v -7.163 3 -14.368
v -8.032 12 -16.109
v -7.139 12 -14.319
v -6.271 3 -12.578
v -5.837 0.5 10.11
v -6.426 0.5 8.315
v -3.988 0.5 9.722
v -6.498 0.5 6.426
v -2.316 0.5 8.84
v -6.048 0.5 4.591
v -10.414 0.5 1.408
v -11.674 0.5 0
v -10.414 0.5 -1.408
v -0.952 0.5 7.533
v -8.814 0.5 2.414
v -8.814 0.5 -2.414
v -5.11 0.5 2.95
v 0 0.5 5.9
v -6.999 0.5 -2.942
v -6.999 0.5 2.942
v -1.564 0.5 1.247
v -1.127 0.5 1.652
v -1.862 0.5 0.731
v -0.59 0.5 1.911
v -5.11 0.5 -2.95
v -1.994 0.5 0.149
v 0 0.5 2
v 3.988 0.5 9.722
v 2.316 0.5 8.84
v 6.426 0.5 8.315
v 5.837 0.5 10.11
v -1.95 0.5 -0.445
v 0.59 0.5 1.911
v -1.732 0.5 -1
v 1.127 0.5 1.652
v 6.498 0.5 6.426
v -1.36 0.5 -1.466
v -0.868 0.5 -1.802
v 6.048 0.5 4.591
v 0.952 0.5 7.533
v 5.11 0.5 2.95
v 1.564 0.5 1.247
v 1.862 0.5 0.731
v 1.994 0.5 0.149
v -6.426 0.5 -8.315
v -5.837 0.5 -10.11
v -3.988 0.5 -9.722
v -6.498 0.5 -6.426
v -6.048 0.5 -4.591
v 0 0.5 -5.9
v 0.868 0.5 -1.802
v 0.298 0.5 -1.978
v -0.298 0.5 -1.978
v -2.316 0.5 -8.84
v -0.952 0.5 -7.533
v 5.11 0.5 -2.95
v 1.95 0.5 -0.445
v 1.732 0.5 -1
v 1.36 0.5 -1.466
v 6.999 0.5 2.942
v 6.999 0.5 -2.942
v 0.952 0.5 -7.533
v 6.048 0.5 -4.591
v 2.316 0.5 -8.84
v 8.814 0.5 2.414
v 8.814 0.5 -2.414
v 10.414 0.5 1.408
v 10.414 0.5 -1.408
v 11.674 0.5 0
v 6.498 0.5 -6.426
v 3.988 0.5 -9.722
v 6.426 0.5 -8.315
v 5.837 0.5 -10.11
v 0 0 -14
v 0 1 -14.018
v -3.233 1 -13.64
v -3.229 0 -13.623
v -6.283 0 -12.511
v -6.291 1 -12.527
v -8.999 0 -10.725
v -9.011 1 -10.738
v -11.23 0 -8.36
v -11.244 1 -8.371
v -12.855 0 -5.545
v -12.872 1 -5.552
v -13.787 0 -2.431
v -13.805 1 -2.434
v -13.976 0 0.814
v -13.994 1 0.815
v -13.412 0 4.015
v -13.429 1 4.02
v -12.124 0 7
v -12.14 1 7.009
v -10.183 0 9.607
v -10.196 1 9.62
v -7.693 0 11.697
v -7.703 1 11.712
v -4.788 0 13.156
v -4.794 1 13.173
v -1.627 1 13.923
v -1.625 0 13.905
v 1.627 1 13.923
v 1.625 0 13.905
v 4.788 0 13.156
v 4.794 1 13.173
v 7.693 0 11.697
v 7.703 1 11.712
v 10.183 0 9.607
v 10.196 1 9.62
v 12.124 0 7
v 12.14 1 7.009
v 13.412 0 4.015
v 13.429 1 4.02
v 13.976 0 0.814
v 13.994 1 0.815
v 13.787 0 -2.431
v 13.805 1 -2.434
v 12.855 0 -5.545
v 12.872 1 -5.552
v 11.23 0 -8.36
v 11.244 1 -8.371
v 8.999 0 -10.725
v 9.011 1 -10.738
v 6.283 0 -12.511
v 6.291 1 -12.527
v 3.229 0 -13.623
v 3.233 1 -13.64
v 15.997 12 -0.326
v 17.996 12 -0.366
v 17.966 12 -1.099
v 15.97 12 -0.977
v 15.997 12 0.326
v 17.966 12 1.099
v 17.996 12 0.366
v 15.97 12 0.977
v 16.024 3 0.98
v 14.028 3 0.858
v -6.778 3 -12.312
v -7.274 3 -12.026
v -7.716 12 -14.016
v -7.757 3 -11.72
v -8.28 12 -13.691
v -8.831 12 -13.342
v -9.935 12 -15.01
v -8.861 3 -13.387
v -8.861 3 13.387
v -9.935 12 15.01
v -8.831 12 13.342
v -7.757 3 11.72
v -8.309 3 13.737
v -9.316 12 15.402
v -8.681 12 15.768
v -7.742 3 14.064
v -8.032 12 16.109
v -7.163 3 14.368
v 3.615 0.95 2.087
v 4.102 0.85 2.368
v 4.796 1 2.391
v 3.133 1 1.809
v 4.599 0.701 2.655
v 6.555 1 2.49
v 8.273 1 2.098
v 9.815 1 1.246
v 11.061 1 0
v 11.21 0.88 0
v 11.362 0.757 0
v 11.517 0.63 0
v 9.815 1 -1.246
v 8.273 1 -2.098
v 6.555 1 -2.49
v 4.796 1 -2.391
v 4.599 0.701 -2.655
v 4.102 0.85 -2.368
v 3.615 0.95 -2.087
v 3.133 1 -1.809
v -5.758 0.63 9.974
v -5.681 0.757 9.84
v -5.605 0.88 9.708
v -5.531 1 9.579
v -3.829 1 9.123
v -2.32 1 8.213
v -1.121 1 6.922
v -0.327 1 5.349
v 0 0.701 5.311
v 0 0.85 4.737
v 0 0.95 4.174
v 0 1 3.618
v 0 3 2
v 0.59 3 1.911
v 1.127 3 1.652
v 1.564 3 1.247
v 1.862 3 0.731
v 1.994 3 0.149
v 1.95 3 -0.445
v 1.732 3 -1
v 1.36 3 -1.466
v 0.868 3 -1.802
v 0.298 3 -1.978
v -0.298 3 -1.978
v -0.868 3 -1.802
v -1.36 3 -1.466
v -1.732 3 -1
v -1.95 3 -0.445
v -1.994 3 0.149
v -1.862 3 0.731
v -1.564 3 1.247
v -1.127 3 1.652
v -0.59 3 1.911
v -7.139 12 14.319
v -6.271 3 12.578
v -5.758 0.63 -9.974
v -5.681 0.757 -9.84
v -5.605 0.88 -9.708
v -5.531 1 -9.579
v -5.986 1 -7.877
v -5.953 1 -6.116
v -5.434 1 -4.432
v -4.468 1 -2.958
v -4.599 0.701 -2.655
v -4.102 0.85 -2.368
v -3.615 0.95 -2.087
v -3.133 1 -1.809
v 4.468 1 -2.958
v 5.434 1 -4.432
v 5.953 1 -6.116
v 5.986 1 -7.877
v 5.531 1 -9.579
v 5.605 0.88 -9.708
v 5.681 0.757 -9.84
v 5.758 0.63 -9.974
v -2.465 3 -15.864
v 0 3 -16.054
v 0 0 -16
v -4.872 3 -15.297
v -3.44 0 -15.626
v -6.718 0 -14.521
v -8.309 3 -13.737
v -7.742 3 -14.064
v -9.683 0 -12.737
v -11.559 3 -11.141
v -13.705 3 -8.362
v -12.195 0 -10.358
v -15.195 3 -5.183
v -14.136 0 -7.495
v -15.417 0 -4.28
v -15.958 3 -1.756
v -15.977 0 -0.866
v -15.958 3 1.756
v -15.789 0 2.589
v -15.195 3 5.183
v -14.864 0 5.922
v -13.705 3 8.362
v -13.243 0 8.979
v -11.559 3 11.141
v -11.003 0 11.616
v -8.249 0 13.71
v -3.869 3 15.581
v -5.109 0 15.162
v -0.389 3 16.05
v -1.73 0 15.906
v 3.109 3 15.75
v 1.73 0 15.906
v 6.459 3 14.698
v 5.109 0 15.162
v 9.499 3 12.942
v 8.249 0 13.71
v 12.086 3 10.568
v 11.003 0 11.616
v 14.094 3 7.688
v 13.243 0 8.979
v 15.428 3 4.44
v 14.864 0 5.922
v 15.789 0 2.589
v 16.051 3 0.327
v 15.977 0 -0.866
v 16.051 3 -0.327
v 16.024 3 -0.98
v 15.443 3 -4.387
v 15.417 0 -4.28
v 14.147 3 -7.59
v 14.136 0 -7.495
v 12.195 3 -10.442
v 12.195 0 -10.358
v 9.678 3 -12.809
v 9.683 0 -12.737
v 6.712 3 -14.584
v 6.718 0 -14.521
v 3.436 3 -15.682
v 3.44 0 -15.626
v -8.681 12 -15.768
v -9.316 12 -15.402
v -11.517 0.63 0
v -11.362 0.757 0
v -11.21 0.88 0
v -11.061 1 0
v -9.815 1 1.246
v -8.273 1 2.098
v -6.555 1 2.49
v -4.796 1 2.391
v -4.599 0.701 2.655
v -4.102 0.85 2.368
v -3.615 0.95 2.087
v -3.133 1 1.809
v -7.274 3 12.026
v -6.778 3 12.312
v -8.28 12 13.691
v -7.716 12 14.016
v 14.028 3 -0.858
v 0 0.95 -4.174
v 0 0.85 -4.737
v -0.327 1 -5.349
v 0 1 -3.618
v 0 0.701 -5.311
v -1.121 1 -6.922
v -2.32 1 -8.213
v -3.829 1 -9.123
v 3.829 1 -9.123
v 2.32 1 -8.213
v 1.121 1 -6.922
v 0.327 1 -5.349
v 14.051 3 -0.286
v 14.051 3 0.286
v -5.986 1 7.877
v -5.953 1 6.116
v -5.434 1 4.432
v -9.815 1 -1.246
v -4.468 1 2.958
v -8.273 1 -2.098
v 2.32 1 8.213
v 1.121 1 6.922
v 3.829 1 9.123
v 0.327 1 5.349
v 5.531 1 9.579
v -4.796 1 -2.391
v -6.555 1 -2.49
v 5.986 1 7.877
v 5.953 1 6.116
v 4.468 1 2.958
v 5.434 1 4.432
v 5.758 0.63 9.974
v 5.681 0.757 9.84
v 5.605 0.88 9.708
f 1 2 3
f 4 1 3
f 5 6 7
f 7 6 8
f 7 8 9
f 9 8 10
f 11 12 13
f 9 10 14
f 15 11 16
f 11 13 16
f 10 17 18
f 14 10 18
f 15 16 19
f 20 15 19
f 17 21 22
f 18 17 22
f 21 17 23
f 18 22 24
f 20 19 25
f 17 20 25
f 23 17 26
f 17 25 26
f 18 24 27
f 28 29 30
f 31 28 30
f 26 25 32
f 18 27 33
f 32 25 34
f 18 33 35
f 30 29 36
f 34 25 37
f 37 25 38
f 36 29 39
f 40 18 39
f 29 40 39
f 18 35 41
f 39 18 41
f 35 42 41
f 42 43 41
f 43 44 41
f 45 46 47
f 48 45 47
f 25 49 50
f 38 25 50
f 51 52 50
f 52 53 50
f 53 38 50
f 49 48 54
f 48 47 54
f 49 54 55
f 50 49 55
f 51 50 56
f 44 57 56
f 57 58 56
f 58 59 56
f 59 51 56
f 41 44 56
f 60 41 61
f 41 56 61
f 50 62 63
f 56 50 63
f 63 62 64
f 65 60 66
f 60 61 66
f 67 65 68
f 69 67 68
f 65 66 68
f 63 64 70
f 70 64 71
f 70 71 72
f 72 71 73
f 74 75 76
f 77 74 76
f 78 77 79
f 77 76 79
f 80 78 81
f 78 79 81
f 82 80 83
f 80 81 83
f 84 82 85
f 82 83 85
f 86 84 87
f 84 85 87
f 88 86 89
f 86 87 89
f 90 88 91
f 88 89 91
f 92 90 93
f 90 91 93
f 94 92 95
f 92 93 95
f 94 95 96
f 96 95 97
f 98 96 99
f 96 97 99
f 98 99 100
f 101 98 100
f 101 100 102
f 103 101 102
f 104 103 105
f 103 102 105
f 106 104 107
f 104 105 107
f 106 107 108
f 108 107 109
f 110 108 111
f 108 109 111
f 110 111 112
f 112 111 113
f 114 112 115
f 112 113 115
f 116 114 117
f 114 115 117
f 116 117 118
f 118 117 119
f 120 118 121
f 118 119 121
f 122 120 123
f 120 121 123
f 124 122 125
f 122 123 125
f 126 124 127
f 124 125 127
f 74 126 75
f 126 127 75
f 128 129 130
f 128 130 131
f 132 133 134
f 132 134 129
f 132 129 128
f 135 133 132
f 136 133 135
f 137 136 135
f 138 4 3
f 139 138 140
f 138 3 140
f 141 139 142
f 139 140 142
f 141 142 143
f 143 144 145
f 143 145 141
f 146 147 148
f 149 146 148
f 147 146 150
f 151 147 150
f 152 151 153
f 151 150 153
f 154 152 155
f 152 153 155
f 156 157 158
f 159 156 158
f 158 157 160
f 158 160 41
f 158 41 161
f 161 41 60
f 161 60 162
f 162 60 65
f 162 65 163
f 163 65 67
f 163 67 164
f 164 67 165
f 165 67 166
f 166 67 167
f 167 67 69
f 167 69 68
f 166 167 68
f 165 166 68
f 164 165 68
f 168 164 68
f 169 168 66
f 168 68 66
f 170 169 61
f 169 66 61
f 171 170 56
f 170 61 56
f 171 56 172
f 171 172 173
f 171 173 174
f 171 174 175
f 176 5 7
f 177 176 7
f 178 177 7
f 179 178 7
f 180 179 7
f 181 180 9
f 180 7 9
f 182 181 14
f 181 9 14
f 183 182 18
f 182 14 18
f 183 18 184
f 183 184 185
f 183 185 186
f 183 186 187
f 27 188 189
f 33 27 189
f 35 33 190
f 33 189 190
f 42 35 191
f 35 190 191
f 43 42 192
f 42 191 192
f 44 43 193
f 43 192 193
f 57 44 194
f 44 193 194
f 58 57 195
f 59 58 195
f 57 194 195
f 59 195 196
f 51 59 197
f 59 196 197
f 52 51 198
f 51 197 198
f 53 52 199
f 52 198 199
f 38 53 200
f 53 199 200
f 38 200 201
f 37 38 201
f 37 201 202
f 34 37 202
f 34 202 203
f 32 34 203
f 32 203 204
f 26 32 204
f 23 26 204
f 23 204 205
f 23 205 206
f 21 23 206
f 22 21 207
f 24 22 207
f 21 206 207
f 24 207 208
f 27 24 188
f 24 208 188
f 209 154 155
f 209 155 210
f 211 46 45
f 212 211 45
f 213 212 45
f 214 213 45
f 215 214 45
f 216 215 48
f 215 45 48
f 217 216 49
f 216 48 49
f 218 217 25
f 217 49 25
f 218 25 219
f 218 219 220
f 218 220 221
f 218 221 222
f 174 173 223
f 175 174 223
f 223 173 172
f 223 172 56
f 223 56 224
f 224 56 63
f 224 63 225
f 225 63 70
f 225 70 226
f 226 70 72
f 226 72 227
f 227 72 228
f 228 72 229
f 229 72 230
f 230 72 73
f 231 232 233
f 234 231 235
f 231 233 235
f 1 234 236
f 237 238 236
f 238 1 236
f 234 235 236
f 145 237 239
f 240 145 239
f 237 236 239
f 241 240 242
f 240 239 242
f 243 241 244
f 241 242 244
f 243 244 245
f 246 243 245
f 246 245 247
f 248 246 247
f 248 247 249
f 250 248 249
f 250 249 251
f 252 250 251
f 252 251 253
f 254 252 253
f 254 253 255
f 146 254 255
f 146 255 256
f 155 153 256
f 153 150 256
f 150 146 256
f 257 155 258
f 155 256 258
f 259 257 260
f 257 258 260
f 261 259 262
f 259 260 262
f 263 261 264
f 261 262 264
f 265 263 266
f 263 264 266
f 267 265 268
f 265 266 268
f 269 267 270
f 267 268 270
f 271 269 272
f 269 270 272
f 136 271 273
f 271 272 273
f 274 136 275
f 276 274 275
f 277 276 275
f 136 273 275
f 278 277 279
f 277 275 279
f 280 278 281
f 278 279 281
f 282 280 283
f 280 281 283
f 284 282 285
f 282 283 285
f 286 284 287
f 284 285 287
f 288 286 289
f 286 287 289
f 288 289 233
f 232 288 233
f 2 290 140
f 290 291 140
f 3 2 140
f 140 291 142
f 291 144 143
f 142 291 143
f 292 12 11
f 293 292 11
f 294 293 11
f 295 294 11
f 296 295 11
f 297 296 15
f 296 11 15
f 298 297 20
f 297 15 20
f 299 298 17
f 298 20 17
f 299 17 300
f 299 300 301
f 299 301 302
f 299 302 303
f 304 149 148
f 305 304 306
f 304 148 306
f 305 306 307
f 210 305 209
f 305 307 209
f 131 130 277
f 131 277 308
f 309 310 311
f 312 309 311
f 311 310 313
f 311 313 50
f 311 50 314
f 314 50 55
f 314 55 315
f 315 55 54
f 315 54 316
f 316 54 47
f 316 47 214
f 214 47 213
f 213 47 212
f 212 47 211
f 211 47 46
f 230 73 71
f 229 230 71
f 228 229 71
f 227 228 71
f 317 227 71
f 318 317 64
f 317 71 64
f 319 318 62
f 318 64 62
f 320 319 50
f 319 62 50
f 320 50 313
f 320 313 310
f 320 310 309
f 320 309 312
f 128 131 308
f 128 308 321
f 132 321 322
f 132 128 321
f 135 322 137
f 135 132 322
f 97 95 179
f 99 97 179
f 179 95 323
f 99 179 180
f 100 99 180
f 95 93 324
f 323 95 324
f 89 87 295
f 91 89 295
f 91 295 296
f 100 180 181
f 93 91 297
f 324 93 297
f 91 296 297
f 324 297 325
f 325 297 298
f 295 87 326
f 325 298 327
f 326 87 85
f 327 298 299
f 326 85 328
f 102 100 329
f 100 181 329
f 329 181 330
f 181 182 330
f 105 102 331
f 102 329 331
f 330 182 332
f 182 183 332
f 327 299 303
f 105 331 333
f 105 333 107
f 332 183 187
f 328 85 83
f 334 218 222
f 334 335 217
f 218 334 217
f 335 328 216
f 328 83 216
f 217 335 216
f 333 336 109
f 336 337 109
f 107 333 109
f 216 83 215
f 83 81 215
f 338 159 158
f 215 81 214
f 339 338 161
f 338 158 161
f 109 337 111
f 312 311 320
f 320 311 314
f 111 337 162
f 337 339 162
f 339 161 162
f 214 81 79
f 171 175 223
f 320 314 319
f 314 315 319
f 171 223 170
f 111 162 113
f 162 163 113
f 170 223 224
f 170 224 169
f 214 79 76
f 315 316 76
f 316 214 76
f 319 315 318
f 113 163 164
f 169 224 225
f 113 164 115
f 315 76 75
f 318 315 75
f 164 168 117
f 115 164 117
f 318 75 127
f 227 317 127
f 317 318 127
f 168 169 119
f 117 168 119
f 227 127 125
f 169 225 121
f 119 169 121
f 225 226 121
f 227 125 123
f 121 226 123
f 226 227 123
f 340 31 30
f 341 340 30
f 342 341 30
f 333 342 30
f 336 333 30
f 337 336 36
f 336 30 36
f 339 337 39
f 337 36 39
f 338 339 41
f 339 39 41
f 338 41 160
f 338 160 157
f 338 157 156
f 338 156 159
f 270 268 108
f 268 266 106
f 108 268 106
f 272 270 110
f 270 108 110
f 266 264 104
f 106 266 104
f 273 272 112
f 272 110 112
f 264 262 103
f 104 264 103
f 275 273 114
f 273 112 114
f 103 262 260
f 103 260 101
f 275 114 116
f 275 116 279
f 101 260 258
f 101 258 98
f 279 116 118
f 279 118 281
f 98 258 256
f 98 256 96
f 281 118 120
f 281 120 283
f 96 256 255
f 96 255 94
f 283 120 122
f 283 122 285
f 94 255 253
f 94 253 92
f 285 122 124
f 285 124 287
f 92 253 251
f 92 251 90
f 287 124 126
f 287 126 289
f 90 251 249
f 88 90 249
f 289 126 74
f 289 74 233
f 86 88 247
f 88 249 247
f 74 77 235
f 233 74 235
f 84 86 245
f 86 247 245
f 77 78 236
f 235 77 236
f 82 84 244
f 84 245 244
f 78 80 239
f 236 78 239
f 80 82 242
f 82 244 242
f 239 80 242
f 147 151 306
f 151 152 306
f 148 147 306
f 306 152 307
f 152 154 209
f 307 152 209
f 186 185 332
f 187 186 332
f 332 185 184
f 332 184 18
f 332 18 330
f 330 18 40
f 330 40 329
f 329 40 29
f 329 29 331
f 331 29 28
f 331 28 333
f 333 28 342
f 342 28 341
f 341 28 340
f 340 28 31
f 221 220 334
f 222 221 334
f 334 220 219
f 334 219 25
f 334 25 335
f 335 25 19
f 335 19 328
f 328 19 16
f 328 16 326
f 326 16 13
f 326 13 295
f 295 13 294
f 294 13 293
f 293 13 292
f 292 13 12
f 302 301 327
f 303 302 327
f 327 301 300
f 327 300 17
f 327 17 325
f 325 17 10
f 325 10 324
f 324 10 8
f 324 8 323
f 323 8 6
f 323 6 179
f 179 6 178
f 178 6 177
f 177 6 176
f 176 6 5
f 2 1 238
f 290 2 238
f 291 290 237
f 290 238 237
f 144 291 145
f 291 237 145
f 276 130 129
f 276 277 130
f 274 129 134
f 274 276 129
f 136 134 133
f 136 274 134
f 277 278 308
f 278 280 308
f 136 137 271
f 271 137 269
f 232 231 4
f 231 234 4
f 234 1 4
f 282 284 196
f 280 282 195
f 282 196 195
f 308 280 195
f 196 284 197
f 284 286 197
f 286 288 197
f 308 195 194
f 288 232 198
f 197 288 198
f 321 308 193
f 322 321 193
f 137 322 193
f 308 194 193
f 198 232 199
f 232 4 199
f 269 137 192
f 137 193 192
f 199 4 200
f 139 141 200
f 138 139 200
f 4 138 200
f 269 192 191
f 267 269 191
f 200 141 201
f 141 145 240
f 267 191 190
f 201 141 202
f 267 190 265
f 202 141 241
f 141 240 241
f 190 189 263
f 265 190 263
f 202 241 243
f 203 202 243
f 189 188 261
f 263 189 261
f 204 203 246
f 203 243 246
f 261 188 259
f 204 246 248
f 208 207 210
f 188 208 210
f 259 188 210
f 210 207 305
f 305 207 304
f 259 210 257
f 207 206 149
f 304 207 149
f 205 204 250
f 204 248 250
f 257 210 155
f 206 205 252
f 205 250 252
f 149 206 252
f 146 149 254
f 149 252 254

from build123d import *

# Parameters (mm, degrees)
REVOLVE2_ANGLE      = 7
CIRPATTERN1_COUNT   = 3
BOSS_EXTRUDE1_DEPTH = 0.5
BOSS_EXTRUDE1_DRAFT = 45
SKETCH4_R           = 14.13
BOSS_EXTRUDE2_DEPTH = 2
SKETCH5_R           = 2
CUT_EXTRUDE1_DEPTH  = 2.5


with BuildPart() as part:
    # Sketch1 → Revolve1 (revolve)
    with BuildSketch(Plane.XY, mode=Mode.PRIVATE) as revolve1_sk:
        Polygon((14, 0), (14.054310345, 3), (16.054310345, 3), (16, 0), align=None)
    revolve(revolve1_sk.sketch.rotate(Axis((0, 0, 0), (0, 1, 0)), 90), axis=Axis((0, 0, 0), (0, 1, 0)))  # turned: the seam where the file's is

    # Sketch2 → Revolve2 (revolve, symmetric)
    with BuildSketch(Plane.XY) as revolve2_sk:
        Polygon((14.054310345, 3), (16, 12), (18, 12), (16.054310345, 3), align=None)
    revolve2 = revolve(axis=Axis((0, 0, 0), (0, 1, 0)), revolution_arc=REVOLVE2_ANGLE / 2)
    revolve2 = revolve2 + revolve(revolve2_sk.sketch, axis=Axis((0, 0, 0), (0, -1, 0)), revolution_arc=REVOLVE2_ANGLE / 2)

    # CirPattern1: Revolve2 ×3 about axis
    cirpattern1_axis = Axis((0, 0, 0), (0, 1, 0))
    for i in range(1, CIRPATTERN1_COUNT):
        add(revolve2.rotate(cirpattern1_axis, i * 360 / CIRPATTERN1_COUNT))



with BuildPart() as body_2:
    # Sketch3 → Boss-Extrude1 (with draft: the straight prism first)
    with BuildSketch(Plane(origin=(0, 0.5, 0), x_dir=(1, 0, 0), z_dir=(0, 1, 0))):
        with BuildLine():
            ThreePointArc((11.674359761, 0), (8.814058264, 2.414331812), (5.109549882, 2.95))
            ThreePointArc((5.109549882, 2.95), (6.497901814, 6.426032461), (5.837179881, 10.110292126))
            ThreePointArc((5.837179881, 10.110292126), (2.316156449, 8.840364273), (0, 5.9))
            ThreePointArc((0, 5.9), (-2.316156449, 8.840364273), (-5.837179881, 10.110292126))
            ThreePointArc((-5.837179881, 10.110292126), (-6.497901814, 6.426032461), (-5.109549882, 2.95))
            ThreePointArc((-5.109549882, 2.95), (-8.814058264, 2.414331812), (-11.674359761, 0))
            ThreePointArc((-11.674359761, 0), (-8.814058264, -2.414331812), (-5.109549882, -2.95))
            ThreePointArc((-5.109549882, -2.95), (-6.497901814, -6.426032461), (-5.837179881, -10.110292126))
            ThreePointArc((-5.837179881, -10.110292126), (-2.316156449, -8.840364273), (0, -5.9))
            ThreePointArc((0, -5.9), (2.316156449, -8.840364273), (5.837179881, -10.110292126))
            ThreePointArc((5.837179881, -10.110292126), (6.497901814, -6.426032461), (5.109549882, -2.95))
            ThreePointArc((5.109549882, -2.95), (8.814058264, -2.414331812), (11.674359761, 0))
        make_face()
    extrude(amount=BOSS_EXTRUDE1_DEPTH)
    # Boss-Extrude1: the draft: its side faces are tilted about the plane it starts from
    boss_extrude1_sides = [body_2.faces().sort_by_distance(p)[0] for p in [
        (6.497901814, 0.75, 6.426032461),
        (8.814058264, 0.75, 2.414331812),
        (8.814058264, 0.75, -2.414331812),
        (6.497901814, 0.75, -6.426032461),
        (2.316156449, 0.75, -8.840364273),
        (-2.316156449, 0.75, -8.840364273),
        (-6.497901814, 0.75, -6.426032461),
        (-8.814058264, 0.75, -2.414331812),
        (-8.814058264, 0.75, 2.414331812),
        (-6.497901814, 0.75, 6.426032461),
        (-2.316156449, 0.75, 8.840364273),
        (2.316156449, 0.75, 8.840364273),
    ]]
    draft(boss_extrude1_sides, Plane(origin=(0, 0.5, 0), x_dir=(1, 0, 0), z_dir=(0, 1, 0)), BOSS_EXTRUDE1_DRAFT)


with BuildPart() as part_1:
    add(part.part)

    add(body_2.part)  # Boss-Extrude2 merges body 2
    # Sketch4 → Boss-Extrude2 (add)
    with BuildSketch(Plane(origin=(0, 1, 0), x_dir=(1, 0, 0), z_dir=(0, 1, 0))):
        Circle(SKETCH4_R)
    extrude(amount=BOSS_EXTRUDE2_DEPTH)

    # Sketch5 → Cut-Extrude1 (cut)
    with BuildSketch(Plane(origin=(0, 3, 0), x_dir=(1, 0, 0), z_dir=(0, 1, 0))):
        with Locations(Location((0, 0, 0), (0, 0, 270))):  # turned: the seam where the file's is
            Circle(SKETCH5_R)
    extrude(amount=-CUT_EXTRUDE1_DEPTH, mode=Mode.SUBTRACT)


solid = part_1.part
